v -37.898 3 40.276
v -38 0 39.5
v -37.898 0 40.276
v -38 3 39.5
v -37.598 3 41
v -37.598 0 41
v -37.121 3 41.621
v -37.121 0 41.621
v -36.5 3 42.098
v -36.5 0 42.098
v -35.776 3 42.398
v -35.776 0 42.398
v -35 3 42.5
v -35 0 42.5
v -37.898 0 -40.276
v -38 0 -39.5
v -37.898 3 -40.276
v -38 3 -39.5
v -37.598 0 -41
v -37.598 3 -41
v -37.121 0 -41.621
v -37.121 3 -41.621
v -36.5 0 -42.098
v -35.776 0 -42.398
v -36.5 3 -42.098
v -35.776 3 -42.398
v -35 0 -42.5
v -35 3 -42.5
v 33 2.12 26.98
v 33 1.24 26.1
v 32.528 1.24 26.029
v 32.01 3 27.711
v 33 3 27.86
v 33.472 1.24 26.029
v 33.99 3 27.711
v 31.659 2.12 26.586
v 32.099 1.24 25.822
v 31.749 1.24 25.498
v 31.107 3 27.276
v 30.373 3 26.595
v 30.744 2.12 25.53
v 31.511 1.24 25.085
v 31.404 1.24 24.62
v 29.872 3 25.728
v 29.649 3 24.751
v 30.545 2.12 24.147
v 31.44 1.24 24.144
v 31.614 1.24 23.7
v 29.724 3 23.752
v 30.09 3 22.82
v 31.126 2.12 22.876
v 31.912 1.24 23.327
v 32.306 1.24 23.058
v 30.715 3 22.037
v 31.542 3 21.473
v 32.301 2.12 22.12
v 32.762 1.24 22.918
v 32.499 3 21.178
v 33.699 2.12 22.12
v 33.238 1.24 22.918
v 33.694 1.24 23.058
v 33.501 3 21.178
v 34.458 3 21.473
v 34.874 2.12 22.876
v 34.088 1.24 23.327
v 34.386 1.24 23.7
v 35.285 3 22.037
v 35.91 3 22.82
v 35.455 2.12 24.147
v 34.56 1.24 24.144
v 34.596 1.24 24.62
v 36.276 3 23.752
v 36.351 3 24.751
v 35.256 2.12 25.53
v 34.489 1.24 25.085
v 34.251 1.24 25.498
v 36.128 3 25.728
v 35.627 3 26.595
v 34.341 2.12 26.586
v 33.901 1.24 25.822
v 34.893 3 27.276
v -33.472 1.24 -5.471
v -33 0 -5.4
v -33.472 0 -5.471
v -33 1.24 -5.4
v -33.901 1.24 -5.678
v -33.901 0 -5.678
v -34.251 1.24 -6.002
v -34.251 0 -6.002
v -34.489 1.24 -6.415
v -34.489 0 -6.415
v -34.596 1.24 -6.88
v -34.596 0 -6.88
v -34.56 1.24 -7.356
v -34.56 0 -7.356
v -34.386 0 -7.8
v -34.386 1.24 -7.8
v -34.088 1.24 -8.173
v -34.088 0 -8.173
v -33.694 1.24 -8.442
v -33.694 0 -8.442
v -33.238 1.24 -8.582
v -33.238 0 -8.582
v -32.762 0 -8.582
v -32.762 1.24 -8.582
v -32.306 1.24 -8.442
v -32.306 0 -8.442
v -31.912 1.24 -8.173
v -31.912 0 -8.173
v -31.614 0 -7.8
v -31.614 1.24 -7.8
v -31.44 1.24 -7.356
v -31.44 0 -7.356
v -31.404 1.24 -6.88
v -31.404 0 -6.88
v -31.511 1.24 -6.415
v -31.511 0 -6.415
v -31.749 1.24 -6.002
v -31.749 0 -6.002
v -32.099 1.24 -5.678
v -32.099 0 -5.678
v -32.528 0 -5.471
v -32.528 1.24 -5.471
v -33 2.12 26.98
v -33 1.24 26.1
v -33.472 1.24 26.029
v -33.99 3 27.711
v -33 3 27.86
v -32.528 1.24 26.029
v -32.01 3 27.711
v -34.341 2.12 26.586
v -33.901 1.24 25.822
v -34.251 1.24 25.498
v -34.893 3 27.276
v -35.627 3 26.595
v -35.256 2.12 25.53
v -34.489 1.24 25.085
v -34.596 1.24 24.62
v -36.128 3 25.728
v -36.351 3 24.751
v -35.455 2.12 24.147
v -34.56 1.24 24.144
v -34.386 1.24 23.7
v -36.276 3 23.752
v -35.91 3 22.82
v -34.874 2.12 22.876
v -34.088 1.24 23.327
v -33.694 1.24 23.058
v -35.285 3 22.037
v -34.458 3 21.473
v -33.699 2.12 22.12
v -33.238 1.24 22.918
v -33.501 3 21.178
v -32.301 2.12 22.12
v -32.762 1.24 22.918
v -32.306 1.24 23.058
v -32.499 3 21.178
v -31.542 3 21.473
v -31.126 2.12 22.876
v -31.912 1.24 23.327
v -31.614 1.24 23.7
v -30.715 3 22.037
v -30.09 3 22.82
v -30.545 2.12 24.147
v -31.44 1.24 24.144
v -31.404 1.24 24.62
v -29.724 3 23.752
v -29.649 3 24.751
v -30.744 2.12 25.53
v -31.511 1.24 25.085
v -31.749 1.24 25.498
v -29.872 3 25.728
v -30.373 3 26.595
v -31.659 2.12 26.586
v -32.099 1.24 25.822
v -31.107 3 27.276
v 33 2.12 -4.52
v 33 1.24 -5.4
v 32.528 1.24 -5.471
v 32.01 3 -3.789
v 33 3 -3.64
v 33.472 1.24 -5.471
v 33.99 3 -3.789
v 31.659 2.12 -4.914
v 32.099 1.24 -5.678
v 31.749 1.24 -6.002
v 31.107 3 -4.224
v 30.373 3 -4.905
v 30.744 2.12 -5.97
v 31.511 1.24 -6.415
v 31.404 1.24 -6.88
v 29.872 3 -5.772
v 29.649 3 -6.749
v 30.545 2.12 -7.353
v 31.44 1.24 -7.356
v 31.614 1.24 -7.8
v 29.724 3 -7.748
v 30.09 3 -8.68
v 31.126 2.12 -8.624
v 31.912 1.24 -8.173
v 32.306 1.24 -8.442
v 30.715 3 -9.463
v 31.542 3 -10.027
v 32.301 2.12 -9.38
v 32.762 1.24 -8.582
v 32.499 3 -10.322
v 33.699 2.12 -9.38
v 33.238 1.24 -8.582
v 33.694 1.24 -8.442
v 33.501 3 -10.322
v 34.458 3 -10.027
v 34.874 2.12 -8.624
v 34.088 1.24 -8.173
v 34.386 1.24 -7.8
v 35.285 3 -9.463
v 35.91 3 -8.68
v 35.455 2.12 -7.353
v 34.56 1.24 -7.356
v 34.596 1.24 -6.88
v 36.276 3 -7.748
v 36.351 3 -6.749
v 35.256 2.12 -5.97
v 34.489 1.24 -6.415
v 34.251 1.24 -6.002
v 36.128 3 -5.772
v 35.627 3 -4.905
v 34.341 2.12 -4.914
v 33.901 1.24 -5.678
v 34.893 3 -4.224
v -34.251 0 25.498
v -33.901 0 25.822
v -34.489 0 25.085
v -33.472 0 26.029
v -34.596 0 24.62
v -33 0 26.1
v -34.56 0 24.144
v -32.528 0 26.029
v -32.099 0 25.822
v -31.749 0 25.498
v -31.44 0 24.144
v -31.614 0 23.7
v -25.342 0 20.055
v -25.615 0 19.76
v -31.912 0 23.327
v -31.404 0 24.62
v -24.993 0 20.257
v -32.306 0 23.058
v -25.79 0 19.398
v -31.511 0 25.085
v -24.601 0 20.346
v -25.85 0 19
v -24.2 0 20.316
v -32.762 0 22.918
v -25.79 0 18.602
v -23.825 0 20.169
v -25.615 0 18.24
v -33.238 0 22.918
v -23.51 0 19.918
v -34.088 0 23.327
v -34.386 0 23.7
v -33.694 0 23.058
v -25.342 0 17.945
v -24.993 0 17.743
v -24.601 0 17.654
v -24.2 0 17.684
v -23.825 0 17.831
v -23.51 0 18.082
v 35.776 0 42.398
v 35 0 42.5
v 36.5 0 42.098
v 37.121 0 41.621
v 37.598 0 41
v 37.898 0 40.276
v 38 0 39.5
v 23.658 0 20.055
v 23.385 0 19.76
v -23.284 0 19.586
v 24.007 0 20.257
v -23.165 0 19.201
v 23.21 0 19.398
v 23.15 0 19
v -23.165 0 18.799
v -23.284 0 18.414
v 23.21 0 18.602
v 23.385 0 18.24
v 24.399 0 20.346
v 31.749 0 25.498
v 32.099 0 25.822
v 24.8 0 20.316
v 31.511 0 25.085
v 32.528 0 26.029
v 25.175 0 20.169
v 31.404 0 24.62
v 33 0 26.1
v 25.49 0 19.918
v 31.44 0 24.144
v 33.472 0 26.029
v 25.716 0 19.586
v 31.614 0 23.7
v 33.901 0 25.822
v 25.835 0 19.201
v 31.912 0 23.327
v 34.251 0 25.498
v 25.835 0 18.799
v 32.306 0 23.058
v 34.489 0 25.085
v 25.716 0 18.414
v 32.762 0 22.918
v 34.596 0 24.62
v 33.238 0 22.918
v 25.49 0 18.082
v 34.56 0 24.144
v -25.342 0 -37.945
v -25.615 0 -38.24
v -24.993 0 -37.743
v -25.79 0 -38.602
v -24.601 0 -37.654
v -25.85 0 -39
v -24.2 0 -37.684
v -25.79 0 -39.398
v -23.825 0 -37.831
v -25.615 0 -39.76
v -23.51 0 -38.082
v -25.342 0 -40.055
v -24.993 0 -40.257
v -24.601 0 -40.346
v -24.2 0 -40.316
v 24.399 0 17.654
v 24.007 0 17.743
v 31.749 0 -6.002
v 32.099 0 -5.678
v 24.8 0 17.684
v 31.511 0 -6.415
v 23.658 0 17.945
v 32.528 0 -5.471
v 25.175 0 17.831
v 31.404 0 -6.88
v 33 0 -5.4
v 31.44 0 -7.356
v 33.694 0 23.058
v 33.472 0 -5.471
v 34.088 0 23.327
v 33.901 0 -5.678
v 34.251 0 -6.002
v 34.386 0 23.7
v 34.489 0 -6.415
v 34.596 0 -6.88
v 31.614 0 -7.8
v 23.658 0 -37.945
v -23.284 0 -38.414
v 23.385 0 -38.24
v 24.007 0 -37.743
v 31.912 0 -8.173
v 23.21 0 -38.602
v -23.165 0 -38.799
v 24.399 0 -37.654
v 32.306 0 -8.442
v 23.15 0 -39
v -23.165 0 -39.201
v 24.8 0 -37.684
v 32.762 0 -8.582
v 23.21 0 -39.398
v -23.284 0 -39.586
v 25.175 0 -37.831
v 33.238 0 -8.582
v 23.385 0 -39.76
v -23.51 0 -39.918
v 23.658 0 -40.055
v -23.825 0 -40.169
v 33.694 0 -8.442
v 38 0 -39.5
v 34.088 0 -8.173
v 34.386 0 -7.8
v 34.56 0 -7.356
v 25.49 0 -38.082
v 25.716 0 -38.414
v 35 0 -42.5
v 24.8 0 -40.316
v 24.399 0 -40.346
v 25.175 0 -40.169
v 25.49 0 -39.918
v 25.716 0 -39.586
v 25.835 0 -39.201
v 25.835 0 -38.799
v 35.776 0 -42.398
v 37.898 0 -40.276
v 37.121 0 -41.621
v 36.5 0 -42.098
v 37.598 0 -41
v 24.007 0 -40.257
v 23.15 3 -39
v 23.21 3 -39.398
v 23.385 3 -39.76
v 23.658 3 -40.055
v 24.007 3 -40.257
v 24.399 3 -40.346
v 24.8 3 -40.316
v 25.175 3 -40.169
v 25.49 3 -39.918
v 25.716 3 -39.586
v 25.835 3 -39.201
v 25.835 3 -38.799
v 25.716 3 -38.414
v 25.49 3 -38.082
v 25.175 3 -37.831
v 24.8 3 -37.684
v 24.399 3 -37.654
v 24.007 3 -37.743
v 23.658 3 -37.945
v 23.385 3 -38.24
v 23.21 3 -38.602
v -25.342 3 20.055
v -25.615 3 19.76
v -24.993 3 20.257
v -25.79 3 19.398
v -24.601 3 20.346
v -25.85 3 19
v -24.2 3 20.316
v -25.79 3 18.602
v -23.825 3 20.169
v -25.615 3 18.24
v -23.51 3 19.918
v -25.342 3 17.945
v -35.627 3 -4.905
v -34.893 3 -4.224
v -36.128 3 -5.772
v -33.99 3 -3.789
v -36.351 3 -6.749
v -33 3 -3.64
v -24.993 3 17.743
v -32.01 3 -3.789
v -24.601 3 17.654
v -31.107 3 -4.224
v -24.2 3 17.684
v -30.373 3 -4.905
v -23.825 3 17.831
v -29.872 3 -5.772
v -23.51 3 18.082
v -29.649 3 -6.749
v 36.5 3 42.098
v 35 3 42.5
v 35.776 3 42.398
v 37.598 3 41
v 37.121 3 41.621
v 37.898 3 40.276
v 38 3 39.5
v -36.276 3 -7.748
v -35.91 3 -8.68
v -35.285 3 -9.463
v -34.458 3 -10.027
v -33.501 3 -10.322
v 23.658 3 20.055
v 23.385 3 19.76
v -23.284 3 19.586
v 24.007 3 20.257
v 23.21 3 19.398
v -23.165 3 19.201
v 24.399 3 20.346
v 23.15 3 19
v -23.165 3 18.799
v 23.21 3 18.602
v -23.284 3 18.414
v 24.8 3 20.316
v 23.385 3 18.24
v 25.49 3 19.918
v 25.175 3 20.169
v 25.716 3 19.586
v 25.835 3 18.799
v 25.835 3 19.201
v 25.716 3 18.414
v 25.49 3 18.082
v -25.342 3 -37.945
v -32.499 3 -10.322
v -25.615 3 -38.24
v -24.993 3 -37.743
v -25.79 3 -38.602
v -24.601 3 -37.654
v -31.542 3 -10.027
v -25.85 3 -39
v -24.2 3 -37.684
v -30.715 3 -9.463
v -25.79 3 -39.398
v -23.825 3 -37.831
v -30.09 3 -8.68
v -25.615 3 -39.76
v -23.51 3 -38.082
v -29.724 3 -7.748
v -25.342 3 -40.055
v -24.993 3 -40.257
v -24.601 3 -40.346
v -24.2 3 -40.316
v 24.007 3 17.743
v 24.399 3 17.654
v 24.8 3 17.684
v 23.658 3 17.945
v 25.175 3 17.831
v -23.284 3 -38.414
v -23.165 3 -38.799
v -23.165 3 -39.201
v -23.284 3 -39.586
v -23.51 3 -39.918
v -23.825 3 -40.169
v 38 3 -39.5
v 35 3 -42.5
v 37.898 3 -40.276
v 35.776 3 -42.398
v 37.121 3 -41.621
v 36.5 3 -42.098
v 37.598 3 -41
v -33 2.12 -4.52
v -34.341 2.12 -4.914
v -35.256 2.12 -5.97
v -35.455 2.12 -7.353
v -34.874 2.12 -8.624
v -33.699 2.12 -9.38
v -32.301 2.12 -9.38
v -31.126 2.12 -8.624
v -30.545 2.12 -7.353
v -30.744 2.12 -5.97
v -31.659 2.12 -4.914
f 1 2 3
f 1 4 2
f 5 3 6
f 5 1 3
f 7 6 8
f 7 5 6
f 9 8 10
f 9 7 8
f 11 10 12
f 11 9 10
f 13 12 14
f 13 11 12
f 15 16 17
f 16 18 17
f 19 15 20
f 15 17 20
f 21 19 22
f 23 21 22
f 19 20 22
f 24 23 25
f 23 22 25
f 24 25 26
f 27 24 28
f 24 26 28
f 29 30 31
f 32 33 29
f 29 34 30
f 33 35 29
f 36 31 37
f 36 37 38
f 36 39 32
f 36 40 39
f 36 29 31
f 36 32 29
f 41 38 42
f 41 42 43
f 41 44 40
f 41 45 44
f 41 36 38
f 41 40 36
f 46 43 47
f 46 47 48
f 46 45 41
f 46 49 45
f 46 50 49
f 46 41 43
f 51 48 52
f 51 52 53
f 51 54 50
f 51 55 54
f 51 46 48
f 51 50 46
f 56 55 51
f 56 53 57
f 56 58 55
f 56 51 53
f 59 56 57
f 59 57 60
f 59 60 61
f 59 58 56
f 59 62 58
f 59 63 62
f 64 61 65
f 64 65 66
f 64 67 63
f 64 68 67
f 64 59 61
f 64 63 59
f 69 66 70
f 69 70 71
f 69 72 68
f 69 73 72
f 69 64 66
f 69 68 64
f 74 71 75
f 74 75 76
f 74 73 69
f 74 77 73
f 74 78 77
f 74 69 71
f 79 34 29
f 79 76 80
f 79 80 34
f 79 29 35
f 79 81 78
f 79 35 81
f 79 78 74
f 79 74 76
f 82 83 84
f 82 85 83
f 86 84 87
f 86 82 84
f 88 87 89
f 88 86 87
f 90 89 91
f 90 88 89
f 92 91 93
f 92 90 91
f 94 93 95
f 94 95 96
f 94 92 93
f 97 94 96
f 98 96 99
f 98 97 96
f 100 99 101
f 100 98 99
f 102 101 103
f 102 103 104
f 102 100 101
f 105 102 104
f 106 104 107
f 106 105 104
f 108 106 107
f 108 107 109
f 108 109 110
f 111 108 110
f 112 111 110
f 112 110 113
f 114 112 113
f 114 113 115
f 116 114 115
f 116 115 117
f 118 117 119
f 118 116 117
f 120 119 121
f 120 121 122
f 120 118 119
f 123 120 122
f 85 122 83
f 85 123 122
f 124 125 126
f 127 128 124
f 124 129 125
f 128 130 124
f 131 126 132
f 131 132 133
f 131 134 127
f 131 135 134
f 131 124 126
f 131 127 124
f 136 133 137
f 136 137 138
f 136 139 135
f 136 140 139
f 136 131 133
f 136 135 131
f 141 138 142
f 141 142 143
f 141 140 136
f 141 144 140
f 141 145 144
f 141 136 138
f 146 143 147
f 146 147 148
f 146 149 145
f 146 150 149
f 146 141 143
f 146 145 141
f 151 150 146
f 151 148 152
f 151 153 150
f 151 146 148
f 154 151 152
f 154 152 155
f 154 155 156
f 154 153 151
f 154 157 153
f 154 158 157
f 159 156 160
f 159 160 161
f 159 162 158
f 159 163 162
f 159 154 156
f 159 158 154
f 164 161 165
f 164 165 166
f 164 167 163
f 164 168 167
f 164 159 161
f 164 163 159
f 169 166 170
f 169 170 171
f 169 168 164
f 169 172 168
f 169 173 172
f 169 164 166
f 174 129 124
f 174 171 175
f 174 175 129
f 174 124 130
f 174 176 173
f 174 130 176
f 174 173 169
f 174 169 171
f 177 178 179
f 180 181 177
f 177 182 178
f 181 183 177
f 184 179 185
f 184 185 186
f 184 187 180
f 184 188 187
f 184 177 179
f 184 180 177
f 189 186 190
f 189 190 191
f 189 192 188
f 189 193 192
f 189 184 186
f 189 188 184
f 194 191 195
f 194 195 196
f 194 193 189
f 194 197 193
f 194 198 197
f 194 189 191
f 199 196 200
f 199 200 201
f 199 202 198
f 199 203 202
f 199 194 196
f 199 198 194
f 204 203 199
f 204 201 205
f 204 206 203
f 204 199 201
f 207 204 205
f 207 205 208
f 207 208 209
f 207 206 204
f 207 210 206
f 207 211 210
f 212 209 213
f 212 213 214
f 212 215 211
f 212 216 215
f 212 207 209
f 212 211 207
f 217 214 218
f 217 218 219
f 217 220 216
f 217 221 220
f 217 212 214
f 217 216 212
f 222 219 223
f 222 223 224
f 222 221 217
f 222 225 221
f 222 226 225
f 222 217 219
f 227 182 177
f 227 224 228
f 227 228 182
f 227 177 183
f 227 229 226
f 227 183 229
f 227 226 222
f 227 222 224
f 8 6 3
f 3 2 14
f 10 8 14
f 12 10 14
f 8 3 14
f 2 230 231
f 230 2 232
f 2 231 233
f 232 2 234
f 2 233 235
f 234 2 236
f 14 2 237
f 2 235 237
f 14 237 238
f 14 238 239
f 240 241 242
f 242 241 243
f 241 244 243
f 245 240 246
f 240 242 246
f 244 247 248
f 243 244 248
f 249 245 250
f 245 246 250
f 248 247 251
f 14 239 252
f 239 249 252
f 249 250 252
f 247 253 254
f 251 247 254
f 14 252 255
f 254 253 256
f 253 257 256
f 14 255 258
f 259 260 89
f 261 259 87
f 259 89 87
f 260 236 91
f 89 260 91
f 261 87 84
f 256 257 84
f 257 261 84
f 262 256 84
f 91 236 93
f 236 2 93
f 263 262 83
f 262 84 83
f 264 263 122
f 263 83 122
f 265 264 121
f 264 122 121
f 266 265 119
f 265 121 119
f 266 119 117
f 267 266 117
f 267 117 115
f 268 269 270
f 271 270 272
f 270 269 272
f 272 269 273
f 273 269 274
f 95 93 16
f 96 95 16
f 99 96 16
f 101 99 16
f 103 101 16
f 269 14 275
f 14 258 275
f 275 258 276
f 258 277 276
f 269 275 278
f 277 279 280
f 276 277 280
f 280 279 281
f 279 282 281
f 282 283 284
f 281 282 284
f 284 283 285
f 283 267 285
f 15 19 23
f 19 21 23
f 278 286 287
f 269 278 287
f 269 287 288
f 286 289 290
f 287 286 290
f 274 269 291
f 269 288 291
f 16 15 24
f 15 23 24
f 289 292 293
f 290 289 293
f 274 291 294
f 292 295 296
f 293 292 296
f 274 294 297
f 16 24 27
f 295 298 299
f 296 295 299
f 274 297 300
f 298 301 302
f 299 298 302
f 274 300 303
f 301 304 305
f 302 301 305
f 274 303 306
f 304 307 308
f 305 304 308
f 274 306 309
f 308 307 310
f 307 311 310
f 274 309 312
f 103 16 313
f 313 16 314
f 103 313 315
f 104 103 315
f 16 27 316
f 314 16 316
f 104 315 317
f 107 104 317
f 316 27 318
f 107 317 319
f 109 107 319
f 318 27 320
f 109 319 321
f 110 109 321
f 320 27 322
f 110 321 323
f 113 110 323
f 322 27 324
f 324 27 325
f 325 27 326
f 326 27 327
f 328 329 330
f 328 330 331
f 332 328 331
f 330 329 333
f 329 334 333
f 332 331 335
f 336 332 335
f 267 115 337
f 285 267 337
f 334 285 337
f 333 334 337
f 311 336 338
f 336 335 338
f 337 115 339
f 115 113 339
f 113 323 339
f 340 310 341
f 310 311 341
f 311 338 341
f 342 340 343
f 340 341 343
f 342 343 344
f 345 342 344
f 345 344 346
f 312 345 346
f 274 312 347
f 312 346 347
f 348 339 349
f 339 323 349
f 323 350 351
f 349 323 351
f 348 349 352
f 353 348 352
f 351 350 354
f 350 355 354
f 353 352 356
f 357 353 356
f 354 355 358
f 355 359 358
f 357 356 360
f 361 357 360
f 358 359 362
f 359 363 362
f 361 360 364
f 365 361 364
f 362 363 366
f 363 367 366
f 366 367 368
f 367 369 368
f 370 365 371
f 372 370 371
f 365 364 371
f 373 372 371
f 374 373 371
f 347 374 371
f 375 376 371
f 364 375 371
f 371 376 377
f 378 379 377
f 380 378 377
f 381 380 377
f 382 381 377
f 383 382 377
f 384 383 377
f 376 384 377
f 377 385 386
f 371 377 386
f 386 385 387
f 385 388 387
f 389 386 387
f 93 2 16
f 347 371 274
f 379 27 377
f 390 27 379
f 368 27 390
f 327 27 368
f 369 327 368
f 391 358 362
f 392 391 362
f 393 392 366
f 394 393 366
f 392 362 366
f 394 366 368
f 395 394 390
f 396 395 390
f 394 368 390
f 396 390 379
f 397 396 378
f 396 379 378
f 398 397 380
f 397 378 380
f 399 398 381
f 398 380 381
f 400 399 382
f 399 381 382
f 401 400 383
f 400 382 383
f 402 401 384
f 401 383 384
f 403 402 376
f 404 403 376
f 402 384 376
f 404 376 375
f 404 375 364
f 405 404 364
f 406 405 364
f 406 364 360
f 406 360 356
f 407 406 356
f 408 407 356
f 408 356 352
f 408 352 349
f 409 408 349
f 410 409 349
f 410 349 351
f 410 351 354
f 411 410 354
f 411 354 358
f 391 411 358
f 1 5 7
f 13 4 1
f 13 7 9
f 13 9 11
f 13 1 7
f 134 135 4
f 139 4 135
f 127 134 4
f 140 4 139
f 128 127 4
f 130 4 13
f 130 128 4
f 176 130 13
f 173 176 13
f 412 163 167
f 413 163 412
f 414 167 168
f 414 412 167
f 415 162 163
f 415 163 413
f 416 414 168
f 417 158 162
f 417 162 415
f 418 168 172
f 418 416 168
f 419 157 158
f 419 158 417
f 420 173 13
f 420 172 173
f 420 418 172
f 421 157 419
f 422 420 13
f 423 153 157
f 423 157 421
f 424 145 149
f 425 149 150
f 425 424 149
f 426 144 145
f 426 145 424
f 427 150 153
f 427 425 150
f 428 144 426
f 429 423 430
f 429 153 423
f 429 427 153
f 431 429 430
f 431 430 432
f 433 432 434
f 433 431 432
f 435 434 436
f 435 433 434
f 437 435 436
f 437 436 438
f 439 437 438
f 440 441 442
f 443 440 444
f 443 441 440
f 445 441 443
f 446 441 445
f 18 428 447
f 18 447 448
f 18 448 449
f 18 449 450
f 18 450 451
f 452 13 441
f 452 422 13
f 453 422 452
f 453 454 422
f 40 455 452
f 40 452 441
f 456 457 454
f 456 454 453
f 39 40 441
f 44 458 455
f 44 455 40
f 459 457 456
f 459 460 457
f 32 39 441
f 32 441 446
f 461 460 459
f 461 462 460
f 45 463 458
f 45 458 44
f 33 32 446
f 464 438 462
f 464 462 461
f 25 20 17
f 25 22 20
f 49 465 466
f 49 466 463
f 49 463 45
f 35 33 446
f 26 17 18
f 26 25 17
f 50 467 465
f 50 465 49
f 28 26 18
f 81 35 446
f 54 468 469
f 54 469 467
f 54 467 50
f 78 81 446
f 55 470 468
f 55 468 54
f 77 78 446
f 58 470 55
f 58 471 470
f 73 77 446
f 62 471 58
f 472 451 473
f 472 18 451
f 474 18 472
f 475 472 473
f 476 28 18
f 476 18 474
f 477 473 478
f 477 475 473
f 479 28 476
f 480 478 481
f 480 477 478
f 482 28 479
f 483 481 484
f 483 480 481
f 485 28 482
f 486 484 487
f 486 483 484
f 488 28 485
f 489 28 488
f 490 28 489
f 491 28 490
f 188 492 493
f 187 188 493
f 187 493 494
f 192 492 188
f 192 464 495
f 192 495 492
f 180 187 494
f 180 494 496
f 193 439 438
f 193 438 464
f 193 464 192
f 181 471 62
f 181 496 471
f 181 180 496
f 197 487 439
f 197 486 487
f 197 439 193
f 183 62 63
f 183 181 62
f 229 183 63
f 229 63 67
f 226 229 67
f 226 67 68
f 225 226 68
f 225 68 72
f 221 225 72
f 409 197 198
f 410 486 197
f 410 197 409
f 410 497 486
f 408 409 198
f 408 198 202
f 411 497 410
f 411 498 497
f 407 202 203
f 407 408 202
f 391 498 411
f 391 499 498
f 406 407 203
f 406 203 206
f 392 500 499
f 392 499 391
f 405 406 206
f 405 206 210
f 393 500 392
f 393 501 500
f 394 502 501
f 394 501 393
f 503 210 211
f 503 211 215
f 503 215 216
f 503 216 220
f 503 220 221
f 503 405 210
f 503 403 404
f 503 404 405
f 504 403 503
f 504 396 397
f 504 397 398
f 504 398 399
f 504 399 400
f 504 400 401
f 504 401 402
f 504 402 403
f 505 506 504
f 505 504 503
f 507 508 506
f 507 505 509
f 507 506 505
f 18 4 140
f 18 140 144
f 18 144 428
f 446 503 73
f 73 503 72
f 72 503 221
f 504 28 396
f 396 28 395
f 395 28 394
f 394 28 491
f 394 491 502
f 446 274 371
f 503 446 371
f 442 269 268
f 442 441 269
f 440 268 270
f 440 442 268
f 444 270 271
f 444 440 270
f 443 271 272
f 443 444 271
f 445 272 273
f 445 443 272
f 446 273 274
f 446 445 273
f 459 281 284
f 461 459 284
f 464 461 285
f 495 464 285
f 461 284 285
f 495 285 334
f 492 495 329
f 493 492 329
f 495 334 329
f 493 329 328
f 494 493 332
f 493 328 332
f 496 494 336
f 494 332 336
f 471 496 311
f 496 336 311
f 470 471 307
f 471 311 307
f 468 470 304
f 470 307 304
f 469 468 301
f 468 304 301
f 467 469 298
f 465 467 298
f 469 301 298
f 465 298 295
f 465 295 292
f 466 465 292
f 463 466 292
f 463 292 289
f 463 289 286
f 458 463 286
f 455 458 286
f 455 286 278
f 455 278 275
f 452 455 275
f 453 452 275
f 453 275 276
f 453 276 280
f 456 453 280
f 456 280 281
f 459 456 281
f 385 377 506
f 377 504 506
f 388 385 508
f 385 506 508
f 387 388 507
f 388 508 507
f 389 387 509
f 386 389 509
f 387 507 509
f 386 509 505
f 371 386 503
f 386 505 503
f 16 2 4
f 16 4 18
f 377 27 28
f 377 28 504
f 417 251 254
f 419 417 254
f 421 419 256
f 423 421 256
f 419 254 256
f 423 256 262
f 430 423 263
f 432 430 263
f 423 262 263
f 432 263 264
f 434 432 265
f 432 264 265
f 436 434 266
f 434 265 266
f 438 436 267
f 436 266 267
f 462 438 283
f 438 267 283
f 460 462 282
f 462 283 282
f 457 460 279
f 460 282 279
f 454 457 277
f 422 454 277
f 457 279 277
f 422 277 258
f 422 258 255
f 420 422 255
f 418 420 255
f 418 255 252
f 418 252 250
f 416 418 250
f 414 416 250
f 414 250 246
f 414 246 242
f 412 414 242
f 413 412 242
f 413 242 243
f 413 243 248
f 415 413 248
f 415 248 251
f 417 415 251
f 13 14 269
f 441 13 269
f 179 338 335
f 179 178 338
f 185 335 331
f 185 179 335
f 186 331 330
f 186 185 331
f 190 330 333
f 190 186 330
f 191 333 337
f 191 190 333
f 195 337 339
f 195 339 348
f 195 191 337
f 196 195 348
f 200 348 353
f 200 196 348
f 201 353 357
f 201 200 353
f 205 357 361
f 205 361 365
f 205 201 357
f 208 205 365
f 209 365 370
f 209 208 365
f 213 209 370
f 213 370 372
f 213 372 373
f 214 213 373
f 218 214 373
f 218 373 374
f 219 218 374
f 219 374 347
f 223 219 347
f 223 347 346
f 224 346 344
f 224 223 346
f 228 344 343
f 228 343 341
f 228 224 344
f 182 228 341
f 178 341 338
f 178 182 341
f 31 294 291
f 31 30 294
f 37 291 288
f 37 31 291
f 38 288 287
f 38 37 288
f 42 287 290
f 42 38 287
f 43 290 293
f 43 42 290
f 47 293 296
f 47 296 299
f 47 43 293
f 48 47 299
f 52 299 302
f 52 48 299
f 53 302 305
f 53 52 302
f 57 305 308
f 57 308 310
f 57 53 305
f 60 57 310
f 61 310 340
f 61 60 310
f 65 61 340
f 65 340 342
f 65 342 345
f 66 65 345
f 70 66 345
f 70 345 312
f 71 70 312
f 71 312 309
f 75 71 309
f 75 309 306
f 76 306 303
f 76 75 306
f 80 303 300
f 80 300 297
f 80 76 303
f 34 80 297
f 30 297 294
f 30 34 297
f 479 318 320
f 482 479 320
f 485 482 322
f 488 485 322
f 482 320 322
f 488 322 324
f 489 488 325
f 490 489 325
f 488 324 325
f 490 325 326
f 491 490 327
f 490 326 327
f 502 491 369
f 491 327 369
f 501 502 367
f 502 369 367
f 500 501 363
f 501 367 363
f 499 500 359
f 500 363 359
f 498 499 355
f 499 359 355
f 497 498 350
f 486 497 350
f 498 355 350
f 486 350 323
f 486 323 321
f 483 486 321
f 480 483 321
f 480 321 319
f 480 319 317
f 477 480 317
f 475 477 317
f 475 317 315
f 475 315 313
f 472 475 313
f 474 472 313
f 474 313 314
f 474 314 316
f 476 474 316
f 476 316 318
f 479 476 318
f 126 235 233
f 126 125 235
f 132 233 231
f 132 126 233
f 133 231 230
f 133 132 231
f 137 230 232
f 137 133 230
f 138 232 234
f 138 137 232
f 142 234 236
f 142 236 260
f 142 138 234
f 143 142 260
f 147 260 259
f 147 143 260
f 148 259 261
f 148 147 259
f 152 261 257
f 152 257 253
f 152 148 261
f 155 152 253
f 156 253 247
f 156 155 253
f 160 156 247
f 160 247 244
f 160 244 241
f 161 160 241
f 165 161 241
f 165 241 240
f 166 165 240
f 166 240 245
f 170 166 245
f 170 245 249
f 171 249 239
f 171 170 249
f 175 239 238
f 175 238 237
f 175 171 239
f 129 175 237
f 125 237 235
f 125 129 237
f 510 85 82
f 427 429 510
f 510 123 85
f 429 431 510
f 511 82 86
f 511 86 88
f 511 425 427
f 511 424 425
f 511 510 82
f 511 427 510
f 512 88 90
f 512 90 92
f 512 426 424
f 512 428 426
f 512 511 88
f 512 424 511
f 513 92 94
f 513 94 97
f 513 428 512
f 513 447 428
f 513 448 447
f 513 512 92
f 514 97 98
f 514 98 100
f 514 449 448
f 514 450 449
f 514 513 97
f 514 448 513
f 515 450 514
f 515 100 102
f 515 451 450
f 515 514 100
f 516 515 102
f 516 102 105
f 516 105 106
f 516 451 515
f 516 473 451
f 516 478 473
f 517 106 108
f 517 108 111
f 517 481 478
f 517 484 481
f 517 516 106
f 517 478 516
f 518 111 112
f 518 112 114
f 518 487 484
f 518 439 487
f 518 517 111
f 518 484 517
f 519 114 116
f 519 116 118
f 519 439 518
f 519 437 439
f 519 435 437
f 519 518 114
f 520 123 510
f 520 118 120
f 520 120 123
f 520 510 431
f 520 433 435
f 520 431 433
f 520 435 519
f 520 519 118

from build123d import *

# Parameters (mm, degrees)
SKETCH1_W                    = 76
SKETCH1_H                    = 85
BOSS_EXTRUDE1_DEPTH          = 3
M2_5_CLEARANCE_HOLE1_D       = 2.7
CSK_FOR_M3_SFHCS1_AT_2_COUNT = 2
CSK_FOR_M3_SFHCS1_AT_2_PITCH = 31.5
CSK_FOR_M3_SFHCS1_AT_3_COUNT = 2
CSK_FOR_M3_SFHCS1_AT_3_PITCH = 73.131730459
CSK_FOR_M3_SFHCS1_AT_4_COUNT = 2
CSK_FOR_M3_SFHCS1_AT_4_PITCH = 66
FILLET1_R                    = 3


with BuildPart() as part:
    # Sketch1 → Boss-Extrude1 (new body)
    with BuildSketch(Plane(origin=(0, 0, 0), x_dir=(1, 0, 0), z_dir=(0, 1, 0))):
        Rectangle(SKETCH1_W, SKETCH1_H)
    extrude(amount=BOSS_EXTRUDE1_DEPTH)

    # M2.5 Clearance Hole1 (through all)
    with Locations(Plane(origin=(0, 3, 0), x_dir=(1, 0, 0), z_dir=(0, 1, 0))):
        with Locations((-24.5, 39), (-24.5, -19), (24.5, -19), (24.5, 39)):
            Hole(M2_5_CLEARANCE_HOLE1_D / 2)

    # Sketch5 → CSK for M3 SFHCS1 (revolve, cut)
    with BuildSketch(Plane(origin=(-33, 3, 24.5), x_dir=(0, 0, 1), z_dir=(1, 0, 0))):
        Polygon((0, 0), (0, 3), (1.6, 3), (1.6, 1.76), (3.36, 0), align=None)
    csk_for_m3_sfhcs1 = revolve(axis=Axis((-33, 9.35, 24.5), (0, -1, 0)), mode=Mode.SUBTRACT)

    # CSK for M3 SFHCS1 at 2: CSK for M3 SFHCS1 ×2
    with Locations(*[(0, 0, -i * CSK_FOR_M3_SFHCS1_AT_2_PITCH) for i in range(1, CSK_FOR_M3_SFHCS1_AT_2_COUNT)]):
        add(csk_for_m3_sfhcs1, mode=Mode.SUBTRACT)

    # CSK for M3 SFHCS1 at 3: CSK for M3 SFHCS1 ×2
    with Locations(*[Vector(0.9024810377836799, 0, -0.43072958621493834) * (i * CSK_FOR_M3_SFHCS1_AT_3_PITCH) for i in range(1, CSK_FOR_M3_SFHCS1_AT_3_COUNT)]):
        add(csk_for_m3_sfhcs1, mode=Mode.SUBTRACT)

    # CSK for M3 SFHCS1 at 4: CSK for M3 SFHCS1 ×2
    with Locations(*[(i * CSK_FOR_M3_SFHCS1_AT_4_PITCH, 0, 0) for i in range(1, CSK_FOR_M3_SFHCS1_AT_4_COUNT)]):
        add(csk_for_m3_sfhcs1, mode=Mode.SUBTRACT)

    # Fillet1
    fillet1_edges = [part.edges().sort_by_distance(p)[0] for p in [
        (-38, 1.5, -42.5),
        (38, 1.5, -42.5),
        (38, 1.5, 42.5),
        (-38, 1.5, 42.5),
    ]]
    fillet(fillet1_edges, radius=FILLET1_R)


solid = part.part
